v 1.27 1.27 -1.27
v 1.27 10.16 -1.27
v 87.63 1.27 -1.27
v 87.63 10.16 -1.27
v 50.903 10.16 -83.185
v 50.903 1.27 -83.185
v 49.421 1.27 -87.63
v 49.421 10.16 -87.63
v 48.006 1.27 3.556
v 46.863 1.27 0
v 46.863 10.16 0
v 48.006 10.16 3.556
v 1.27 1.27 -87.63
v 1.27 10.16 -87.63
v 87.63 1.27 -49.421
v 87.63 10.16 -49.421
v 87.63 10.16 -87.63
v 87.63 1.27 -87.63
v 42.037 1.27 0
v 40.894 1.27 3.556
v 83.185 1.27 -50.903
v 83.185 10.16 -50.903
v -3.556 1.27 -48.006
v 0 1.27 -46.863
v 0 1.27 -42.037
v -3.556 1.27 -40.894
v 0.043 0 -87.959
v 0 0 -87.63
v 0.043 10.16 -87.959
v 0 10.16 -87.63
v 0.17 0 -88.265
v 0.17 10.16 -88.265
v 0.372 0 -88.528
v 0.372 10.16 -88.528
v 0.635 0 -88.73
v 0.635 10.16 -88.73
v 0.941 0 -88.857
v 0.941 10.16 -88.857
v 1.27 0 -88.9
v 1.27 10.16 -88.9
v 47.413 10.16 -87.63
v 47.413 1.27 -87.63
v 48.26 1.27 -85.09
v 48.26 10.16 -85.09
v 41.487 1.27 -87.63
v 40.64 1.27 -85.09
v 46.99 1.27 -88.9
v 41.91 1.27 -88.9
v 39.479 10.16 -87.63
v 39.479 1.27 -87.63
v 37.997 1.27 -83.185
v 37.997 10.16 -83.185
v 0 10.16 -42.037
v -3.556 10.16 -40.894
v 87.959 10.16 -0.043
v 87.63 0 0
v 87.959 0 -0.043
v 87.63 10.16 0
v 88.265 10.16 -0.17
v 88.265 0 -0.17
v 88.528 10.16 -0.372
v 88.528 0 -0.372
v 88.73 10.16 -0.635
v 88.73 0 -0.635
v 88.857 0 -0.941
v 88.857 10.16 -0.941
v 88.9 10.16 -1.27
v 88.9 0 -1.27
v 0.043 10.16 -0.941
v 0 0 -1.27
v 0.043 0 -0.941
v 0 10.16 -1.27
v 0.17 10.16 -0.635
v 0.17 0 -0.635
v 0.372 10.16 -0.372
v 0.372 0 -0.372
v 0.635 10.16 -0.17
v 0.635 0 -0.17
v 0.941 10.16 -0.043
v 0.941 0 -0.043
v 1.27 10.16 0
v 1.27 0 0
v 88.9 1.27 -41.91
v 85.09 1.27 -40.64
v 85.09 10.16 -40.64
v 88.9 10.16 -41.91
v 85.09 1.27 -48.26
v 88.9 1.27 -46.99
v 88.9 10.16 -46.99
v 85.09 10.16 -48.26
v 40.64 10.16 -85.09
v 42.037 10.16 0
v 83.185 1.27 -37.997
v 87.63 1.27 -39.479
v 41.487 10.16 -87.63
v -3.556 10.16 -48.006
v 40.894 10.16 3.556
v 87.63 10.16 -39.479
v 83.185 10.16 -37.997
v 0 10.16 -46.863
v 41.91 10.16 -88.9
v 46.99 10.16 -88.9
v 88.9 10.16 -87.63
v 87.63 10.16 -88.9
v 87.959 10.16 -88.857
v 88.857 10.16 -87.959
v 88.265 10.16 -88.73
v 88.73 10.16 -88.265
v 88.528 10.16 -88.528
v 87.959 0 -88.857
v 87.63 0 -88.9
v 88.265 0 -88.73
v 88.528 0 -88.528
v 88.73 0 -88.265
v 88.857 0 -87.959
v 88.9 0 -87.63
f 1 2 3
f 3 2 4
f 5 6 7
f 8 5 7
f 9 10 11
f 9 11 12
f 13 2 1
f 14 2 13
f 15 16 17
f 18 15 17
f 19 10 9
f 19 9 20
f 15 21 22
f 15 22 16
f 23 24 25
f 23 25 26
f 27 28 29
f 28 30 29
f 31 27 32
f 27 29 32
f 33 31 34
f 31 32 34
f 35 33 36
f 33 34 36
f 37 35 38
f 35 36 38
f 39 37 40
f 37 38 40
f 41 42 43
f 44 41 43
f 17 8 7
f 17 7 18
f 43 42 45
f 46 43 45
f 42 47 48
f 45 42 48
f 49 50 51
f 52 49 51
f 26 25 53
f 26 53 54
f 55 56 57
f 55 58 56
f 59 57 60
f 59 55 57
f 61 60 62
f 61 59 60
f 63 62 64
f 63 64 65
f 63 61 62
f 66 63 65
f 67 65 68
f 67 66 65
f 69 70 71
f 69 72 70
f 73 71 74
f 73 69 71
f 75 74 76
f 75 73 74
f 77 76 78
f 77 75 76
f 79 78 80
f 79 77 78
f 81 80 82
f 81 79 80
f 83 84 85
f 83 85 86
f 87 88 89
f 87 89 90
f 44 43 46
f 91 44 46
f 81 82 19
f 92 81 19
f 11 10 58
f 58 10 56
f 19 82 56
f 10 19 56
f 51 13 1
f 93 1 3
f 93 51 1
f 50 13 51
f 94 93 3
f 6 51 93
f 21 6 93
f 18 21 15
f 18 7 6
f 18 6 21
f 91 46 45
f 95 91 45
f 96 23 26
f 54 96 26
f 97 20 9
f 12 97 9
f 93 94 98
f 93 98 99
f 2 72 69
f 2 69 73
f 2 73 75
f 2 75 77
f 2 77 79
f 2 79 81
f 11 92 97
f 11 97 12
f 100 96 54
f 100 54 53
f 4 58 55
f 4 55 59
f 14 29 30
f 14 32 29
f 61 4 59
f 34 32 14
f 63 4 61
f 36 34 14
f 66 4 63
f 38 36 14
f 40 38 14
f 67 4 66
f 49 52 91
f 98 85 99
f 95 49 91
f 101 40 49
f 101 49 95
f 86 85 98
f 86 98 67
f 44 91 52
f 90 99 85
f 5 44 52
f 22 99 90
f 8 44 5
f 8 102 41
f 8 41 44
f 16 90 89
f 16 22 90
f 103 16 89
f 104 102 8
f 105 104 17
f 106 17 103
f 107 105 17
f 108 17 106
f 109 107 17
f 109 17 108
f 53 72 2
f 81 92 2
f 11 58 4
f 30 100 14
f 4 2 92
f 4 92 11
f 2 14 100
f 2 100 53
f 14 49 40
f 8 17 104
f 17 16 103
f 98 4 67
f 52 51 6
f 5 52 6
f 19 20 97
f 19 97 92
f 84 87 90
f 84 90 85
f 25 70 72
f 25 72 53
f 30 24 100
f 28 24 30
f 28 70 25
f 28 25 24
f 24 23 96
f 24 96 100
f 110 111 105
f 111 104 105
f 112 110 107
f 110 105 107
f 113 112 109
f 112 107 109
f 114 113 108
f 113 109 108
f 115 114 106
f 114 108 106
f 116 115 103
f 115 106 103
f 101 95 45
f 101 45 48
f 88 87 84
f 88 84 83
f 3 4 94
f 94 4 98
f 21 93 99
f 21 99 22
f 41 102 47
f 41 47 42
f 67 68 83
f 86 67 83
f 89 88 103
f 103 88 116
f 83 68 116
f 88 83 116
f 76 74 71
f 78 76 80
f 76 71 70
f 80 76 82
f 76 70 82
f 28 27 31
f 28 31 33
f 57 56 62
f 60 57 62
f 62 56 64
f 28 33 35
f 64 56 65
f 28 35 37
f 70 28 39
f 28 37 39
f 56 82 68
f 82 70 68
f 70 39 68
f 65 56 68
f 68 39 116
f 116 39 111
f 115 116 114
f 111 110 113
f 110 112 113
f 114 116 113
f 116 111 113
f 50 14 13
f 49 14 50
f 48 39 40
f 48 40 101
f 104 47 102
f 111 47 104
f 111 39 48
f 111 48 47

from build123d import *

# Parameters (mm, degrees)
SKETCH1_W               = 88.9
SKETCH1_H               = 88.9
BASE_DRAIN_TRAY_DEPTH   = 10.16
SKETCH2_W               = 86.36
SKETCH2_H               = 86.36
DRAIN_TRAY_CUTOUT_DEPTH = 8.89
SKETCH3_W               = 71.12
SKETCH3_H               = 71.12
BODY_DEPTH              = 50.8
SKETCH4_W               = 68.58
SKETCH4_H               = 68.58
BODY_CUTOUT_DEPTH       = 50.8
FILLET1_R               = 1.27
JOINING_SLOT_DEPTH      = 8.89
JOINING_CUTOUT_DEPTH    = 8.89
JOINING_SLOT_2_DEPTH    = 8.89
JOINING_CUTOUT_2_DEPTH  = 8.89
BOSS_EXTRUDE3_DEPTH     = 8.89
SKETCH14_W              = 71.12
SKETCH14_H              = 71.12
CUT_EXTRUDE2_DEPTH      = 50.8


with BuildPart() as part:
    # Sketch1 → Base/Drain Tray (new body)
    with BuildSketch(Plane(origin=(0, 0, 0), x_dir=(1, 0, 0), z_dir=(0, 1, 0))):
        with Locations((44.45, 44.45)):
            Rectangle(SKETCH1_W, SKETCH1_H)
    extrude(amount=BASE_DRAIN_TRAY_DEPTH)

    # Sketch2 → Drain Tray Cutout (cut)
    with BuildSketch(Plane(origin=(0, 10.16, 0), x_dir=(1, 0, 0), z_dir=(0, 1, 0))):
        with Locations((44.45, 44.45)):
            Rectangle(SKETCH2_W, SKETCH2_H)
    extrude(amount=-DRAIN_TRAY_CUTOUT_DEPTH, mode=Mode.SUBTRACT)

    # Sketch3 → Body (add)
    with BuildSketch(Plane(origin=(0, 1.27, 0), x_dir=(1, 0, 0), z_dir=(0, 1, 0))):
        with Locations((44.45, 44.45)):
            Rectangle(SKETCH3_W, SKETCH3_H)
    extrude(amount=BODY_DEPTH)

    # Sketch4 → Body Cutout (cut)
    with BuildSketch(Plane(origin=(0, 52.07, 0), x_dir=(1, 0, 0), z_dir=(0, 1, 0))):
        with Locations((44.45, 44.45)):
            Rectangle(SKETCH4_W, SKETCH4_H)
    extrude(amount=-BODY_CUTOUT_DEPTH, mode=Mode.SUBTRACT)

    # Fillet1
    fillet1_edges = [part.edges().sort_by_distance(p)[0] for p in [
        (0, 5.08, -88.9),
        (88.9, 5.08, -88.9),
        (88.9, 5.08, 0),
        (0, 5.08, 0),
    ]]
    fillet(fillet1_edges, radius=FILLET1_R)

    # Sketch7 → Joining Slot (add)
    with BuildSketch(Plane(origin=(0, 1.27, 0), x_dir=(1, 0, 0), z_dir=(0, 1, 0))):
        Polygon((40.64, 85.09), (41.486666667, 87.63), (39.478620352, 87.63), (37.996953686, 83.185), (50.903046314, 83.185), (49.421379648, 87.63), (47.413333333, 87.63), (48.26, 85.09), align=None)
    extrude(amount=JOINING_SLOT_DEPTH)

    # Sketch8 → Joining Cutout (cut)
    with BuildSketch(Plane(origin=(0, 10.16, 0), x_dir=(1, 0, 0), z_dir=(0, 1, 0))):
        Polygon((40.64, 85.09), (41.486666667, 87.63), (41.91, 88.9), (46.99, 88.9), (47.413333333, 87.63), (48.26, 85.09), align=None)
    extrude(amount=-JOINING_CUTOUT_DEPTH, mode=Mode.SUBTRACT)

    # Sketch10 → Joining Slot 2 (add)
    with BuildSketch(Plane(origin=(0, 1.27, 0), x_dir=(1, 0, 0), z_dir=(0, 1, 0))):
        Polygon((87.63, 49.421379648), (87.63, 39.478620352), (83.185, 37.996953686), (83.185, 50.903046314), align=None)
    extrude(amount=JOINING_SLOT_2_DEPTH)

    # Sketch12 → Joining Cutout 2 (cut)
    with BuildSketch(Plane(origin=(0, 1.27, 0), x_dir=(1, 0, 0), z_dir=(0, 1, 0))):
        Polygon((88.9, 41.91), (88.9, 46.99), (85.09, 48.26), (85.09, 40.64), align=None)
    extrude(amount=JOINING_CUTOUT_2_DEPTH, mode=Mode.SUBTRACT)

    # Sketch13 → Boss-Extrude3 (add)
    with BuildSketch(Plane(origin=(0, 1.27, 0), x_dir=(1, 0, 0), z_dir=(0, 1, 0))):
        Polygon((42.037, 0), (46.863, 0), (48.006, -3.556), (44.45, -3.556), (40.894, -3.556), align=None)
        Polygon((0, 46.863), (0, 42.037), (-3.556, 40.894), (-3.556, 44.45), (-3.556, 48.006), align=None)
    extrude(amount=BOSS_EXTRUDE3_DEPTH)

    # Sketch14 → Cut-Extrude2 (cut)
    with BuildSketch(Plane(origin=(0, 52.07, 0), x_dir=(1, 0, 0), z_dir=(0, 1, 0))):
        with Locations((44.45, 44.45)):
            Rectangle(SKETCH14_W, SKETCH14_H)
    extrude(amount=-CUT_EXTRUDE2_DEPTH, mode=Mode.SUBTRACT)


solid = part.part
